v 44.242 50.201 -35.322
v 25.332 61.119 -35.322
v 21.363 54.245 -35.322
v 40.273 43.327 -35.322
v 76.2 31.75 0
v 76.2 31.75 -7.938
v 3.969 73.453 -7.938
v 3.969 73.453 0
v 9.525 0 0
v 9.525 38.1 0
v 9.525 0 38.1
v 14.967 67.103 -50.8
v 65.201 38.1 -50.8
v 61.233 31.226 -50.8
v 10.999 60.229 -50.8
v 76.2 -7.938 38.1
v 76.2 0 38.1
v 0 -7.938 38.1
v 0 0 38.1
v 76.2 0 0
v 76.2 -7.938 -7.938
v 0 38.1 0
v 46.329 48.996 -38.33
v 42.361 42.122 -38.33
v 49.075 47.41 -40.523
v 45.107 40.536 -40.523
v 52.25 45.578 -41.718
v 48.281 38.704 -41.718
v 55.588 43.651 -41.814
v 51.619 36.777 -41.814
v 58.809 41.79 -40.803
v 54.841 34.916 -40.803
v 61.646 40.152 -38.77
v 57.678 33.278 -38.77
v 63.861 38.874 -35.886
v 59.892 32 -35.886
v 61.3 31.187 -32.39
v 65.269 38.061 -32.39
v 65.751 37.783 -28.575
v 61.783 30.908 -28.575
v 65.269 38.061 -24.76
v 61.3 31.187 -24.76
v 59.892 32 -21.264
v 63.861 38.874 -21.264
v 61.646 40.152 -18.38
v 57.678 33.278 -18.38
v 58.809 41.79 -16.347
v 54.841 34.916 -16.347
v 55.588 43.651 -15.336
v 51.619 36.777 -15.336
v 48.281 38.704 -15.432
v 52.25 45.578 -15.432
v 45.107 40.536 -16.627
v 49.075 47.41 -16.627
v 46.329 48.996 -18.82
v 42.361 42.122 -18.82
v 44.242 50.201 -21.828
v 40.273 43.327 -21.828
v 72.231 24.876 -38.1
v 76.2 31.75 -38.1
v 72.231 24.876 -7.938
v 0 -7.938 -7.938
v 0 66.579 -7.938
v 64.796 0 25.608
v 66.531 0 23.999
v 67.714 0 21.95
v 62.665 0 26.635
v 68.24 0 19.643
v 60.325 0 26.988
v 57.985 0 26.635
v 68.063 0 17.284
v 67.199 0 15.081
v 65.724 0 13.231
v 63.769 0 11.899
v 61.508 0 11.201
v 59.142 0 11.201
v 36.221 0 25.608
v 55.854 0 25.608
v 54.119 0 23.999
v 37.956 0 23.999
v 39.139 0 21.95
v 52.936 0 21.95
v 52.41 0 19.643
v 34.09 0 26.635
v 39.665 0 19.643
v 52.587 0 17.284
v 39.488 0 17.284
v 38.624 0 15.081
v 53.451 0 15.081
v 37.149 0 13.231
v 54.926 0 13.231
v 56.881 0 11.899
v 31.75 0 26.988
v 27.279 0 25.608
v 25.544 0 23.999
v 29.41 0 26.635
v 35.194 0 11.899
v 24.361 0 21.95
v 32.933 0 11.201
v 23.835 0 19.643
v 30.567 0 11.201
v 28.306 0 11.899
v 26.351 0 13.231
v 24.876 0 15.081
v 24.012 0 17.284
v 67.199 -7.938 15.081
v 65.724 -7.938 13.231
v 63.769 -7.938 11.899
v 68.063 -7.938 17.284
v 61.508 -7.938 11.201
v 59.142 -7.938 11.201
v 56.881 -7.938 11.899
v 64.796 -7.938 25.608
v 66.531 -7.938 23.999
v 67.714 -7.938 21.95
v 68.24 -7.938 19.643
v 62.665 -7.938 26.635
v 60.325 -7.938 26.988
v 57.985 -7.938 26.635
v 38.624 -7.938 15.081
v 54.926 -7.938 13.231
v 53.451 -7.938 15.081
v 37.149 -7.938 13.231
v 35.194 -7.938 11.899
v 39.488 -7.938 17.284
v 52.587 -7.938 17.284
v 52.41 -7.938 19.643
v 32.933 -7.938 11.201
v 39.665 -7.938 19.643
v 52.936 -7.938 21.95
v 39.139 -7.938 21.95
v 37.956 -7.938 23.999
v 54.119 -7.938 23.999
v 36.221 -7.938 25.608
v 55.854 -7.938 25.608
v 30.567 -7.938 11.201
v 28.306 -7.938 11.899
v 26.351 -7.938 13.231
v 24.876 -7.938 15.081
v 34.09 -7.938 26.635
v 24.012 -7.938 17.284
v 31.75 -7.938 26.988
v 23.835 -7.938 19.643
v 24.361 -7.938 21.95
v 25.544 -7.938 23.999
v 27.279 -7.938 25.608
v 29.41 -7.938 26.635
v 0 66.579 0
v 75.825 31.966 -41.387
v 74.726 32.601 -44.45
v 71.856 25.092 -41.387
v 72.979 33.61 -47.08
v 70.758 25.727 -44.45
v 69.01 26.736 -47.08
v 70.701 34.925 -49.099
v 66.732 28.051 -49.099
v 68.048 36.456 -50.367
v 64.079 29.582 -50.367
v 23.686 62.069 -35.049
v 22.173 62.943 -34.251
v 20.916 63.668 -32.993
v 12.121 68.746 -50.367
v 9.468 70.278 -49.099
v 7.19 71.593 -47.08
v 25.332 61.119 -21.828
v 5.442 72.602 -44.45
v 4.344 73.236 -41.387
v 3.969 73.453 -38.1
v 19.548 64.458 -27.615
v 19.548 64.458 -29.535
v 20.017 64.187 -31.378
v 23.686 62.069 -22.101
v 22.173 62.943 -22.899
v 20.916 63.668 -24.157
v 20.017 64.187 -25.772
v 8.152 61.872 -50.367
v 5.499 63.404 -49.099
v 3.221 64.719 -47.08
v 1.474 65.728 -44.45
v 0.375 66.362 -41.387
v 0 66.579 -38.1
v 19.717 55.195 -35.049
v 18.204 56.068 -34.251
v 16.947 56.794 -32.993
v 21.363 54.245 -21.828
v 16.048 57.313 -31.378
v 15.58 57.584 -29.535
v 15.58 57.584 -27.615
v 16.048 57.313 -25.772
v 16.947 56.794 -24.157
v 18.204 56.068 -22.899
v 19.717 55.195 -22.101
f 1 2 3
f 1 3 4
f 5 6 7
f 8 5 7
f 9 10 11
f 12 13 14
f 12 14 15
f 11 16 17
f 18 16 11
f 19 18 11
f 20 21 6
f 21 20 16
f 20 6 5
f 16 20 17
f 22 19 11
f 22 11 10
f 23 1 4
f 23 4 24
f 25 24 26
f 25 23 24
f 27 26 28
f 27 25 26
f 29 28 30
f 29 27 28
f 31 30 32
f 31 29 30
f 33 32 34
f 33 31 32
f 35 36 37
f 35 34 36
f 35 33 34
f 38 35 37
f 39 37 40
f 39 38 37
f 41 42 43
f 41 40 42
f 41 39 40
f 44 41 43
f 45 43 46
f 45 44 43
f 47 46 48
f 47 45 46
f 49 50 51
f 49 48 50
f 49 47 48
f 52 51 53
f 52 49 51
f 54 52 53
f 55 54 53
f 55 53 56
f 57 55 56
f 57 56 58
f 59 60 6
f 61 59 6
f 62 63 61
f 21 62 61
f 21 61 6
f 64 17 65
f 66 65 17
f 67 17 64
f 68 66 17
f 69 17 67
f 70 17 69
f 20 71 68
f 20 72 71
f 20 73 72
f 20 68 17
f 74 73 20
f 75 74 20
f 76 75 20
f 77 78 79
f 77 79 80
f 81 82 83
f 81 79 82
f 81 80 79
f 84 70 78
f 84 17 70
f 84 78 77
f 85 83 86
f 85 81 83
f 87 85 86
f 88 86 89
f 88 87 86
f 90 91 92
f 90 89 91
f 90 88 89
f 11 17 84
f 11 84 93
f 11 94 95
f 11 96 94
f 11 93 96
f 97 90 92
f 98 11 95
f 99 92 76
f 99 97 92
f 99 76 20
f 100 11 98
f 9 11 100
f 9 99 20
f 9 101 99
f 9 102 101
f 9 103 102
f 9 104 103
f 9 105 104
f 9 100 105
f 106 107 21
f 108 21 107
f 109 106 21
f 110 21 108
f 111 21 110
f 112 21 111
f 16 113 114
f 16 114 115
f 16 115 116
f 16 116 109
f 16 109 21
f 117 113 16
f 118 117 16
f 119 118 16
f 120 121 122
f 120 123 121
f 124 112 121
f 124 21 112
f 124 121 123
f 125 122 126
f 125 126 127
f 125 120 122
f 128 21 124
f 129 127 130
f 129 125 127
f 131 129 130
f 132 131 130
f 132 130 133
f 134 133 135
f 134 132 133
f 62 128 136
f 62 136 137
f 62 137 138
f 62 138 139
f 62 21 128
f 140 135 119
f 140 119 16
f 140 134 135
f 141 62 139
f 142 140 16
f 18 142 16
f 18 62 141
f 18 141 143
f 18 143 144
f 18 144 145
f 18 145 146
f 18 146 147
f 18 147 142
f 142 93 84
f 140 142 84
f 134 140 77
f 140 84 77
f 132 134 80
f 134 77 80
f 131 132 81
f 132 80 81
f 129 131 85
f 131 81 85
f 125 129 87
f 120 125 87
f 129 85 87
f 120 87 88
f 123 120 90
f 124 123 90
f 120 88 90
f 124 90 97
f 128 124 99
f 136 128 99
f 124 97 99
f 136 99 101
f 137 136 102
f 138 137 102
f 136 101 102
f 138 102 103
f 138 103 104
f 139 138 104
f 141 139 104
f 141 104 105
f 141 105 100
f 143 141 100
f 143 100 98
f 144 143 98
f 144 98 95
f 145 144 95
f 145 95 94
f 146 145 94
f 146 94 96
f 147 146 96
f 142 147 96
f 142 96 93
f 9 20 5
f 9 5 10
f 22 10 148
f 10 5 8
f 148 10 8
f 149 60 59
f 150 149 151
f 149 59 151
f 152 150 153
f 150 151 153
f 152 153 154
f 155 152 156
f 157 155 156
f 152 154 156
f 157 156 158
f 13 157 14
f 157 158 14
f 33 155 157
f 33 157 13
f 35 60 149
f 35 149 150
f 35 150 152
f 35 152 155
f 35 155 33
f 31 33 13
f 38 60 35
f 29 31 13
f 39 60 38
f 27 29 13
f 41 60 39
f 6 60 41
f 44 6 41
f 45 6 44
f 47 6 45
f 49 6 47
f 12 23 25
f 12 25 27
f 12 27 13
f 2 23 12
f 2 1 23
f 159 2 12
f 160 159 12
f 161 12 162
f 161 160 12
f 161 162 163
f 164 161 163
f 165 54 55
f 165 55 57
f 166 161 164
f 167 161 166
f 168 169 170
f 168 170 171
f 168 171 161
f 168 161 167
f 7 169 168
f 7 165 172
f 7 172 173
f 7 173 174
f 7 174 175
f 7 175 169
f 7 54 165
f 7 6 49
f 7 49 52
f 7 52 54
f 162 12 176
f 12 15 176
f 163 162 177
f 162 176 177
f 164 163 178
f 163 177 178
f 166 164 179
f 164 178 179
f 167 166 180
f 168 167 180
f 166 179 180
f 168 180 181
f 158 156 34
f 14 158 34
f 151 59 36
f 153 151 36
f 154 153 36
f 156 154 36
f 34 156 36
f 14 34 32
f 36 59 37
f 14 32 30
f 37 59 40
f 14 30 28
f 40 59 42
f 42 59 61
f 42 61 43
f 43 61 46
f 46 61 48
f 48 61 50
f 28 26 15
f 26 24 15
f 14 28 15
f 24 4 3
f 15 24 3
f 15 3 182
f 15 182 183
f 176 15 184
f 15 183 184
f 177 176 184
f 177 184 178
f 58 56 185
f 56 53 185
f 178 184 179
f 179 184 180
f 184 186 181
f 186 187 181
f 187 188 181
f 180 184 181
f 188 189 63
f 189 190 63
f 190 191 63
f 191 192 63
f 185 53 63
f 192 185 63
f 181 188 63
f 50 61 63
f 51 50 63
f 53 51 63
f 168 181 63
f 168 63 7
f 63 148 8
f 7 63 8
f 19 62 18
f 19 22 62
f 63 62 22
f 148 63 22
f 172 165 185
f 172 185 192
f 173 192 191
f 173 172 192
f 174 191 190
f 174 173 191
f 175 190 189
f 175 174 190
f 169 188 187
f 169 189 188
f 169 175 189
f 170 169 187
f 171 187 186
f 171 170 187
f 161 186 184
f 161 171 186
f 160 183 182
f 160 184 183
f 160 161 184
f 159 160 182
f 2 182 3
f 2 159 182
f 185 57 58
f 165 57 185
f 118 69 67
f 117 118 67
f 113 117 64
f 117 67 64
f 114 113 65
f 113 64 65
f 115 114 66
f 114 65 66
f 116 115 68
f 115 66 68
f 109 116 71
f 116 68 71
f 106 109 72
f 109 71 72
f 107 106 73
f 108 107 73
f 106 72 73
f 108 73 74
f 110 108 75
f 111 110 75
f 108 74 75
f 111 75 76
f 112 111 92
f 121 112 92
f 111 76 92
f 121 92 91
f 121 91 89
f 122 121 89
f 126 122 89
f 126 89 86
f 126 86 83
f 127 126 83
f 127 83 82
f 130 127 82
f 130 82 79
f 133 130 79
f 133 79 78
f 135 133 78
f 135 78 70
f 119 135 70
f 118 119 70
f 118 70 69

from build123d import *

# Parameters (mm, degrees)
BASE_EXTRUDE_THIN_DEPTH = 76.2
BOSS_EXTRUDE1_START     = -7.9375
BOSS_EXTRUDE1_DEPTH     = 7.9375
SKETCH3_W               = 87.988181024
SKETCH3_H               = 50.8
BOSS_EXTRUDE2_DEPTH     = 7.9375
CUT_EXTRUDE1_DEPTH      = 119.845476344
FILLET1_R               = 12.7
BOSS_EXTRUDE3_DEPTH     = 9.525
CUT_EXTRUDE2_DEPTH      = 100.992371073
SKETCH9_R               = 7.9375
CUT_EXTRUDE3_DEPTH      = 118.398397707
LPATTERN2_COUNT         = 2
LPATTERN2_PITCH         = 28.575


# Read off the part's stored shape, not the designer's step: Boss-Extrude1
with BuildPart() as part:
    # Sketch1 → Base-Extrude-Thin (new body)
    with BuildSketch(Plane(origin=(0, 0, 0), x_dir=(0, 0, -1), z_dir=(1, 0, 0))):
        Polygon((-38.1, 0), (0, 0), (0, 31.75), (7.9375, 31.75), (7.9375, -7.9375), (-38.1, -7.9375), align=None)
    extrude(amount=BASE_EXTRUDE_THIN_DEPTH)

    # Boss-Extrude1 outline → Boss-Extrude1 (add)
    with BuildSketch(Plane.XY.offset(BOSS_EXTRUDE1_START)):
        Polygon((76.2, 31.75), (0, 75.744090512), (0, 31.75), align=None)
    extrude(amount=BOSS_EXTRUDE1_DEPTH)

    # Sketch3 → Boss-Extrude2 (add)
    with BuildSketch(Plane(origin=(32.798153285, 56.808067884, 0), x_dir=(-0.8660254037844379, 0.5000000000000014, 0), z_dir=(0.5000000000000014, 0.8660254037844379, 0))):
        with Locations((-6.122045256, -25.4)):
            Rectangle(SKETCH3_W, SKETCH3_H)
    extrude(amount=-BOSS_EXTRUDE2_DEPTH)

    # Sketch4 → Cut-Extrude1 (cut, through all)
    with BuildSketch(Plane.XY):
        Polygon((-113.819682418, -130.562817861), (0, 66.578654989), (3.96875, 73.452731631), (117.788432418, 270.594204481), (-276.494513281, 498.233569317), (-508.102628117, 97.076546976), align=None)
    extrude(amount=-CUT_EXTRUDE1_DEPTH, mode=Mode.SUBTRACT)

    # Fillet1
    fillet1_edges = [part.edges().sort_by_distance(p)[0] for p in [
        (74.215625, 28.312961679, -50.8),
        (1.984375, 70.01569331, -50.8),
    ]]
    fillet(fillet1_edges, radius=FILLET1_R)

    # Sketch5 → Boss-Extrude3 (add)
    with BuildSketch(Plane.ZY):
        Polygon((0, 38.1), (0, 0), (38.1, 0), align=None)
    extrude(amount=-BOSS_EXTRUDE3_DEPTH)

    # Sketch6 → Cut-Extrude2 (cut, through all)
    with BuildSketch(Plane(origin=(24.654916237, 61.509567986, -0.61351416), x_dir=(-0.866025403784438, 0.5000000000000012, 0), z_dir=(0.5000000000000011, 0.8660254037844379, 0))):
        with BuildLine():
            Line((-0.781635971, -34.70836084), (-22.616879552, -34.70836084))
            ThreePointArc((-22.616879552, -34.70836084), (-47.454135971, -27.96148584), (-22.616879552, -21.21461084))
            Line((-22.616879552, -21.21461084), (-0.781635971, -21.21461084))
            ThreePointArc((-0.781635971, -21.21461084), (5.965239029, -27.96148584), (-0.781635971, -34.70836084))
        make_face()
    extrude(amount=-CUT_EXTRUDE2_DEPTH, mode=Mode.SUBTRACT)

    # Sketch9 → Cut-Extrude3 (cut, through all)
    with BuildSketch(Plane(origin=(0, 0, 0), x_dir=(-1, 0, 0), z_dir=(0, 1, 0))):
        with Locations(Location((-60.325, 19.05, 0), (0, 0, 90))):
            Circle(SKETCH9_R)
    cut_extrude3 = extrude(amount=-CUT_EXTRUDE3_DEPTH, mode=Mode.SUBTRACT)

    # LPattern2: Cut-Extrude3 ×2
    with Locations(*[(-i * LPATTERN2_PITCH, 0, 0) for i in range(1, LPATTERN2_COUNT)]):
        add(cut_extrude3, mode=Mode.SUBTRACT)


solid = part.part
